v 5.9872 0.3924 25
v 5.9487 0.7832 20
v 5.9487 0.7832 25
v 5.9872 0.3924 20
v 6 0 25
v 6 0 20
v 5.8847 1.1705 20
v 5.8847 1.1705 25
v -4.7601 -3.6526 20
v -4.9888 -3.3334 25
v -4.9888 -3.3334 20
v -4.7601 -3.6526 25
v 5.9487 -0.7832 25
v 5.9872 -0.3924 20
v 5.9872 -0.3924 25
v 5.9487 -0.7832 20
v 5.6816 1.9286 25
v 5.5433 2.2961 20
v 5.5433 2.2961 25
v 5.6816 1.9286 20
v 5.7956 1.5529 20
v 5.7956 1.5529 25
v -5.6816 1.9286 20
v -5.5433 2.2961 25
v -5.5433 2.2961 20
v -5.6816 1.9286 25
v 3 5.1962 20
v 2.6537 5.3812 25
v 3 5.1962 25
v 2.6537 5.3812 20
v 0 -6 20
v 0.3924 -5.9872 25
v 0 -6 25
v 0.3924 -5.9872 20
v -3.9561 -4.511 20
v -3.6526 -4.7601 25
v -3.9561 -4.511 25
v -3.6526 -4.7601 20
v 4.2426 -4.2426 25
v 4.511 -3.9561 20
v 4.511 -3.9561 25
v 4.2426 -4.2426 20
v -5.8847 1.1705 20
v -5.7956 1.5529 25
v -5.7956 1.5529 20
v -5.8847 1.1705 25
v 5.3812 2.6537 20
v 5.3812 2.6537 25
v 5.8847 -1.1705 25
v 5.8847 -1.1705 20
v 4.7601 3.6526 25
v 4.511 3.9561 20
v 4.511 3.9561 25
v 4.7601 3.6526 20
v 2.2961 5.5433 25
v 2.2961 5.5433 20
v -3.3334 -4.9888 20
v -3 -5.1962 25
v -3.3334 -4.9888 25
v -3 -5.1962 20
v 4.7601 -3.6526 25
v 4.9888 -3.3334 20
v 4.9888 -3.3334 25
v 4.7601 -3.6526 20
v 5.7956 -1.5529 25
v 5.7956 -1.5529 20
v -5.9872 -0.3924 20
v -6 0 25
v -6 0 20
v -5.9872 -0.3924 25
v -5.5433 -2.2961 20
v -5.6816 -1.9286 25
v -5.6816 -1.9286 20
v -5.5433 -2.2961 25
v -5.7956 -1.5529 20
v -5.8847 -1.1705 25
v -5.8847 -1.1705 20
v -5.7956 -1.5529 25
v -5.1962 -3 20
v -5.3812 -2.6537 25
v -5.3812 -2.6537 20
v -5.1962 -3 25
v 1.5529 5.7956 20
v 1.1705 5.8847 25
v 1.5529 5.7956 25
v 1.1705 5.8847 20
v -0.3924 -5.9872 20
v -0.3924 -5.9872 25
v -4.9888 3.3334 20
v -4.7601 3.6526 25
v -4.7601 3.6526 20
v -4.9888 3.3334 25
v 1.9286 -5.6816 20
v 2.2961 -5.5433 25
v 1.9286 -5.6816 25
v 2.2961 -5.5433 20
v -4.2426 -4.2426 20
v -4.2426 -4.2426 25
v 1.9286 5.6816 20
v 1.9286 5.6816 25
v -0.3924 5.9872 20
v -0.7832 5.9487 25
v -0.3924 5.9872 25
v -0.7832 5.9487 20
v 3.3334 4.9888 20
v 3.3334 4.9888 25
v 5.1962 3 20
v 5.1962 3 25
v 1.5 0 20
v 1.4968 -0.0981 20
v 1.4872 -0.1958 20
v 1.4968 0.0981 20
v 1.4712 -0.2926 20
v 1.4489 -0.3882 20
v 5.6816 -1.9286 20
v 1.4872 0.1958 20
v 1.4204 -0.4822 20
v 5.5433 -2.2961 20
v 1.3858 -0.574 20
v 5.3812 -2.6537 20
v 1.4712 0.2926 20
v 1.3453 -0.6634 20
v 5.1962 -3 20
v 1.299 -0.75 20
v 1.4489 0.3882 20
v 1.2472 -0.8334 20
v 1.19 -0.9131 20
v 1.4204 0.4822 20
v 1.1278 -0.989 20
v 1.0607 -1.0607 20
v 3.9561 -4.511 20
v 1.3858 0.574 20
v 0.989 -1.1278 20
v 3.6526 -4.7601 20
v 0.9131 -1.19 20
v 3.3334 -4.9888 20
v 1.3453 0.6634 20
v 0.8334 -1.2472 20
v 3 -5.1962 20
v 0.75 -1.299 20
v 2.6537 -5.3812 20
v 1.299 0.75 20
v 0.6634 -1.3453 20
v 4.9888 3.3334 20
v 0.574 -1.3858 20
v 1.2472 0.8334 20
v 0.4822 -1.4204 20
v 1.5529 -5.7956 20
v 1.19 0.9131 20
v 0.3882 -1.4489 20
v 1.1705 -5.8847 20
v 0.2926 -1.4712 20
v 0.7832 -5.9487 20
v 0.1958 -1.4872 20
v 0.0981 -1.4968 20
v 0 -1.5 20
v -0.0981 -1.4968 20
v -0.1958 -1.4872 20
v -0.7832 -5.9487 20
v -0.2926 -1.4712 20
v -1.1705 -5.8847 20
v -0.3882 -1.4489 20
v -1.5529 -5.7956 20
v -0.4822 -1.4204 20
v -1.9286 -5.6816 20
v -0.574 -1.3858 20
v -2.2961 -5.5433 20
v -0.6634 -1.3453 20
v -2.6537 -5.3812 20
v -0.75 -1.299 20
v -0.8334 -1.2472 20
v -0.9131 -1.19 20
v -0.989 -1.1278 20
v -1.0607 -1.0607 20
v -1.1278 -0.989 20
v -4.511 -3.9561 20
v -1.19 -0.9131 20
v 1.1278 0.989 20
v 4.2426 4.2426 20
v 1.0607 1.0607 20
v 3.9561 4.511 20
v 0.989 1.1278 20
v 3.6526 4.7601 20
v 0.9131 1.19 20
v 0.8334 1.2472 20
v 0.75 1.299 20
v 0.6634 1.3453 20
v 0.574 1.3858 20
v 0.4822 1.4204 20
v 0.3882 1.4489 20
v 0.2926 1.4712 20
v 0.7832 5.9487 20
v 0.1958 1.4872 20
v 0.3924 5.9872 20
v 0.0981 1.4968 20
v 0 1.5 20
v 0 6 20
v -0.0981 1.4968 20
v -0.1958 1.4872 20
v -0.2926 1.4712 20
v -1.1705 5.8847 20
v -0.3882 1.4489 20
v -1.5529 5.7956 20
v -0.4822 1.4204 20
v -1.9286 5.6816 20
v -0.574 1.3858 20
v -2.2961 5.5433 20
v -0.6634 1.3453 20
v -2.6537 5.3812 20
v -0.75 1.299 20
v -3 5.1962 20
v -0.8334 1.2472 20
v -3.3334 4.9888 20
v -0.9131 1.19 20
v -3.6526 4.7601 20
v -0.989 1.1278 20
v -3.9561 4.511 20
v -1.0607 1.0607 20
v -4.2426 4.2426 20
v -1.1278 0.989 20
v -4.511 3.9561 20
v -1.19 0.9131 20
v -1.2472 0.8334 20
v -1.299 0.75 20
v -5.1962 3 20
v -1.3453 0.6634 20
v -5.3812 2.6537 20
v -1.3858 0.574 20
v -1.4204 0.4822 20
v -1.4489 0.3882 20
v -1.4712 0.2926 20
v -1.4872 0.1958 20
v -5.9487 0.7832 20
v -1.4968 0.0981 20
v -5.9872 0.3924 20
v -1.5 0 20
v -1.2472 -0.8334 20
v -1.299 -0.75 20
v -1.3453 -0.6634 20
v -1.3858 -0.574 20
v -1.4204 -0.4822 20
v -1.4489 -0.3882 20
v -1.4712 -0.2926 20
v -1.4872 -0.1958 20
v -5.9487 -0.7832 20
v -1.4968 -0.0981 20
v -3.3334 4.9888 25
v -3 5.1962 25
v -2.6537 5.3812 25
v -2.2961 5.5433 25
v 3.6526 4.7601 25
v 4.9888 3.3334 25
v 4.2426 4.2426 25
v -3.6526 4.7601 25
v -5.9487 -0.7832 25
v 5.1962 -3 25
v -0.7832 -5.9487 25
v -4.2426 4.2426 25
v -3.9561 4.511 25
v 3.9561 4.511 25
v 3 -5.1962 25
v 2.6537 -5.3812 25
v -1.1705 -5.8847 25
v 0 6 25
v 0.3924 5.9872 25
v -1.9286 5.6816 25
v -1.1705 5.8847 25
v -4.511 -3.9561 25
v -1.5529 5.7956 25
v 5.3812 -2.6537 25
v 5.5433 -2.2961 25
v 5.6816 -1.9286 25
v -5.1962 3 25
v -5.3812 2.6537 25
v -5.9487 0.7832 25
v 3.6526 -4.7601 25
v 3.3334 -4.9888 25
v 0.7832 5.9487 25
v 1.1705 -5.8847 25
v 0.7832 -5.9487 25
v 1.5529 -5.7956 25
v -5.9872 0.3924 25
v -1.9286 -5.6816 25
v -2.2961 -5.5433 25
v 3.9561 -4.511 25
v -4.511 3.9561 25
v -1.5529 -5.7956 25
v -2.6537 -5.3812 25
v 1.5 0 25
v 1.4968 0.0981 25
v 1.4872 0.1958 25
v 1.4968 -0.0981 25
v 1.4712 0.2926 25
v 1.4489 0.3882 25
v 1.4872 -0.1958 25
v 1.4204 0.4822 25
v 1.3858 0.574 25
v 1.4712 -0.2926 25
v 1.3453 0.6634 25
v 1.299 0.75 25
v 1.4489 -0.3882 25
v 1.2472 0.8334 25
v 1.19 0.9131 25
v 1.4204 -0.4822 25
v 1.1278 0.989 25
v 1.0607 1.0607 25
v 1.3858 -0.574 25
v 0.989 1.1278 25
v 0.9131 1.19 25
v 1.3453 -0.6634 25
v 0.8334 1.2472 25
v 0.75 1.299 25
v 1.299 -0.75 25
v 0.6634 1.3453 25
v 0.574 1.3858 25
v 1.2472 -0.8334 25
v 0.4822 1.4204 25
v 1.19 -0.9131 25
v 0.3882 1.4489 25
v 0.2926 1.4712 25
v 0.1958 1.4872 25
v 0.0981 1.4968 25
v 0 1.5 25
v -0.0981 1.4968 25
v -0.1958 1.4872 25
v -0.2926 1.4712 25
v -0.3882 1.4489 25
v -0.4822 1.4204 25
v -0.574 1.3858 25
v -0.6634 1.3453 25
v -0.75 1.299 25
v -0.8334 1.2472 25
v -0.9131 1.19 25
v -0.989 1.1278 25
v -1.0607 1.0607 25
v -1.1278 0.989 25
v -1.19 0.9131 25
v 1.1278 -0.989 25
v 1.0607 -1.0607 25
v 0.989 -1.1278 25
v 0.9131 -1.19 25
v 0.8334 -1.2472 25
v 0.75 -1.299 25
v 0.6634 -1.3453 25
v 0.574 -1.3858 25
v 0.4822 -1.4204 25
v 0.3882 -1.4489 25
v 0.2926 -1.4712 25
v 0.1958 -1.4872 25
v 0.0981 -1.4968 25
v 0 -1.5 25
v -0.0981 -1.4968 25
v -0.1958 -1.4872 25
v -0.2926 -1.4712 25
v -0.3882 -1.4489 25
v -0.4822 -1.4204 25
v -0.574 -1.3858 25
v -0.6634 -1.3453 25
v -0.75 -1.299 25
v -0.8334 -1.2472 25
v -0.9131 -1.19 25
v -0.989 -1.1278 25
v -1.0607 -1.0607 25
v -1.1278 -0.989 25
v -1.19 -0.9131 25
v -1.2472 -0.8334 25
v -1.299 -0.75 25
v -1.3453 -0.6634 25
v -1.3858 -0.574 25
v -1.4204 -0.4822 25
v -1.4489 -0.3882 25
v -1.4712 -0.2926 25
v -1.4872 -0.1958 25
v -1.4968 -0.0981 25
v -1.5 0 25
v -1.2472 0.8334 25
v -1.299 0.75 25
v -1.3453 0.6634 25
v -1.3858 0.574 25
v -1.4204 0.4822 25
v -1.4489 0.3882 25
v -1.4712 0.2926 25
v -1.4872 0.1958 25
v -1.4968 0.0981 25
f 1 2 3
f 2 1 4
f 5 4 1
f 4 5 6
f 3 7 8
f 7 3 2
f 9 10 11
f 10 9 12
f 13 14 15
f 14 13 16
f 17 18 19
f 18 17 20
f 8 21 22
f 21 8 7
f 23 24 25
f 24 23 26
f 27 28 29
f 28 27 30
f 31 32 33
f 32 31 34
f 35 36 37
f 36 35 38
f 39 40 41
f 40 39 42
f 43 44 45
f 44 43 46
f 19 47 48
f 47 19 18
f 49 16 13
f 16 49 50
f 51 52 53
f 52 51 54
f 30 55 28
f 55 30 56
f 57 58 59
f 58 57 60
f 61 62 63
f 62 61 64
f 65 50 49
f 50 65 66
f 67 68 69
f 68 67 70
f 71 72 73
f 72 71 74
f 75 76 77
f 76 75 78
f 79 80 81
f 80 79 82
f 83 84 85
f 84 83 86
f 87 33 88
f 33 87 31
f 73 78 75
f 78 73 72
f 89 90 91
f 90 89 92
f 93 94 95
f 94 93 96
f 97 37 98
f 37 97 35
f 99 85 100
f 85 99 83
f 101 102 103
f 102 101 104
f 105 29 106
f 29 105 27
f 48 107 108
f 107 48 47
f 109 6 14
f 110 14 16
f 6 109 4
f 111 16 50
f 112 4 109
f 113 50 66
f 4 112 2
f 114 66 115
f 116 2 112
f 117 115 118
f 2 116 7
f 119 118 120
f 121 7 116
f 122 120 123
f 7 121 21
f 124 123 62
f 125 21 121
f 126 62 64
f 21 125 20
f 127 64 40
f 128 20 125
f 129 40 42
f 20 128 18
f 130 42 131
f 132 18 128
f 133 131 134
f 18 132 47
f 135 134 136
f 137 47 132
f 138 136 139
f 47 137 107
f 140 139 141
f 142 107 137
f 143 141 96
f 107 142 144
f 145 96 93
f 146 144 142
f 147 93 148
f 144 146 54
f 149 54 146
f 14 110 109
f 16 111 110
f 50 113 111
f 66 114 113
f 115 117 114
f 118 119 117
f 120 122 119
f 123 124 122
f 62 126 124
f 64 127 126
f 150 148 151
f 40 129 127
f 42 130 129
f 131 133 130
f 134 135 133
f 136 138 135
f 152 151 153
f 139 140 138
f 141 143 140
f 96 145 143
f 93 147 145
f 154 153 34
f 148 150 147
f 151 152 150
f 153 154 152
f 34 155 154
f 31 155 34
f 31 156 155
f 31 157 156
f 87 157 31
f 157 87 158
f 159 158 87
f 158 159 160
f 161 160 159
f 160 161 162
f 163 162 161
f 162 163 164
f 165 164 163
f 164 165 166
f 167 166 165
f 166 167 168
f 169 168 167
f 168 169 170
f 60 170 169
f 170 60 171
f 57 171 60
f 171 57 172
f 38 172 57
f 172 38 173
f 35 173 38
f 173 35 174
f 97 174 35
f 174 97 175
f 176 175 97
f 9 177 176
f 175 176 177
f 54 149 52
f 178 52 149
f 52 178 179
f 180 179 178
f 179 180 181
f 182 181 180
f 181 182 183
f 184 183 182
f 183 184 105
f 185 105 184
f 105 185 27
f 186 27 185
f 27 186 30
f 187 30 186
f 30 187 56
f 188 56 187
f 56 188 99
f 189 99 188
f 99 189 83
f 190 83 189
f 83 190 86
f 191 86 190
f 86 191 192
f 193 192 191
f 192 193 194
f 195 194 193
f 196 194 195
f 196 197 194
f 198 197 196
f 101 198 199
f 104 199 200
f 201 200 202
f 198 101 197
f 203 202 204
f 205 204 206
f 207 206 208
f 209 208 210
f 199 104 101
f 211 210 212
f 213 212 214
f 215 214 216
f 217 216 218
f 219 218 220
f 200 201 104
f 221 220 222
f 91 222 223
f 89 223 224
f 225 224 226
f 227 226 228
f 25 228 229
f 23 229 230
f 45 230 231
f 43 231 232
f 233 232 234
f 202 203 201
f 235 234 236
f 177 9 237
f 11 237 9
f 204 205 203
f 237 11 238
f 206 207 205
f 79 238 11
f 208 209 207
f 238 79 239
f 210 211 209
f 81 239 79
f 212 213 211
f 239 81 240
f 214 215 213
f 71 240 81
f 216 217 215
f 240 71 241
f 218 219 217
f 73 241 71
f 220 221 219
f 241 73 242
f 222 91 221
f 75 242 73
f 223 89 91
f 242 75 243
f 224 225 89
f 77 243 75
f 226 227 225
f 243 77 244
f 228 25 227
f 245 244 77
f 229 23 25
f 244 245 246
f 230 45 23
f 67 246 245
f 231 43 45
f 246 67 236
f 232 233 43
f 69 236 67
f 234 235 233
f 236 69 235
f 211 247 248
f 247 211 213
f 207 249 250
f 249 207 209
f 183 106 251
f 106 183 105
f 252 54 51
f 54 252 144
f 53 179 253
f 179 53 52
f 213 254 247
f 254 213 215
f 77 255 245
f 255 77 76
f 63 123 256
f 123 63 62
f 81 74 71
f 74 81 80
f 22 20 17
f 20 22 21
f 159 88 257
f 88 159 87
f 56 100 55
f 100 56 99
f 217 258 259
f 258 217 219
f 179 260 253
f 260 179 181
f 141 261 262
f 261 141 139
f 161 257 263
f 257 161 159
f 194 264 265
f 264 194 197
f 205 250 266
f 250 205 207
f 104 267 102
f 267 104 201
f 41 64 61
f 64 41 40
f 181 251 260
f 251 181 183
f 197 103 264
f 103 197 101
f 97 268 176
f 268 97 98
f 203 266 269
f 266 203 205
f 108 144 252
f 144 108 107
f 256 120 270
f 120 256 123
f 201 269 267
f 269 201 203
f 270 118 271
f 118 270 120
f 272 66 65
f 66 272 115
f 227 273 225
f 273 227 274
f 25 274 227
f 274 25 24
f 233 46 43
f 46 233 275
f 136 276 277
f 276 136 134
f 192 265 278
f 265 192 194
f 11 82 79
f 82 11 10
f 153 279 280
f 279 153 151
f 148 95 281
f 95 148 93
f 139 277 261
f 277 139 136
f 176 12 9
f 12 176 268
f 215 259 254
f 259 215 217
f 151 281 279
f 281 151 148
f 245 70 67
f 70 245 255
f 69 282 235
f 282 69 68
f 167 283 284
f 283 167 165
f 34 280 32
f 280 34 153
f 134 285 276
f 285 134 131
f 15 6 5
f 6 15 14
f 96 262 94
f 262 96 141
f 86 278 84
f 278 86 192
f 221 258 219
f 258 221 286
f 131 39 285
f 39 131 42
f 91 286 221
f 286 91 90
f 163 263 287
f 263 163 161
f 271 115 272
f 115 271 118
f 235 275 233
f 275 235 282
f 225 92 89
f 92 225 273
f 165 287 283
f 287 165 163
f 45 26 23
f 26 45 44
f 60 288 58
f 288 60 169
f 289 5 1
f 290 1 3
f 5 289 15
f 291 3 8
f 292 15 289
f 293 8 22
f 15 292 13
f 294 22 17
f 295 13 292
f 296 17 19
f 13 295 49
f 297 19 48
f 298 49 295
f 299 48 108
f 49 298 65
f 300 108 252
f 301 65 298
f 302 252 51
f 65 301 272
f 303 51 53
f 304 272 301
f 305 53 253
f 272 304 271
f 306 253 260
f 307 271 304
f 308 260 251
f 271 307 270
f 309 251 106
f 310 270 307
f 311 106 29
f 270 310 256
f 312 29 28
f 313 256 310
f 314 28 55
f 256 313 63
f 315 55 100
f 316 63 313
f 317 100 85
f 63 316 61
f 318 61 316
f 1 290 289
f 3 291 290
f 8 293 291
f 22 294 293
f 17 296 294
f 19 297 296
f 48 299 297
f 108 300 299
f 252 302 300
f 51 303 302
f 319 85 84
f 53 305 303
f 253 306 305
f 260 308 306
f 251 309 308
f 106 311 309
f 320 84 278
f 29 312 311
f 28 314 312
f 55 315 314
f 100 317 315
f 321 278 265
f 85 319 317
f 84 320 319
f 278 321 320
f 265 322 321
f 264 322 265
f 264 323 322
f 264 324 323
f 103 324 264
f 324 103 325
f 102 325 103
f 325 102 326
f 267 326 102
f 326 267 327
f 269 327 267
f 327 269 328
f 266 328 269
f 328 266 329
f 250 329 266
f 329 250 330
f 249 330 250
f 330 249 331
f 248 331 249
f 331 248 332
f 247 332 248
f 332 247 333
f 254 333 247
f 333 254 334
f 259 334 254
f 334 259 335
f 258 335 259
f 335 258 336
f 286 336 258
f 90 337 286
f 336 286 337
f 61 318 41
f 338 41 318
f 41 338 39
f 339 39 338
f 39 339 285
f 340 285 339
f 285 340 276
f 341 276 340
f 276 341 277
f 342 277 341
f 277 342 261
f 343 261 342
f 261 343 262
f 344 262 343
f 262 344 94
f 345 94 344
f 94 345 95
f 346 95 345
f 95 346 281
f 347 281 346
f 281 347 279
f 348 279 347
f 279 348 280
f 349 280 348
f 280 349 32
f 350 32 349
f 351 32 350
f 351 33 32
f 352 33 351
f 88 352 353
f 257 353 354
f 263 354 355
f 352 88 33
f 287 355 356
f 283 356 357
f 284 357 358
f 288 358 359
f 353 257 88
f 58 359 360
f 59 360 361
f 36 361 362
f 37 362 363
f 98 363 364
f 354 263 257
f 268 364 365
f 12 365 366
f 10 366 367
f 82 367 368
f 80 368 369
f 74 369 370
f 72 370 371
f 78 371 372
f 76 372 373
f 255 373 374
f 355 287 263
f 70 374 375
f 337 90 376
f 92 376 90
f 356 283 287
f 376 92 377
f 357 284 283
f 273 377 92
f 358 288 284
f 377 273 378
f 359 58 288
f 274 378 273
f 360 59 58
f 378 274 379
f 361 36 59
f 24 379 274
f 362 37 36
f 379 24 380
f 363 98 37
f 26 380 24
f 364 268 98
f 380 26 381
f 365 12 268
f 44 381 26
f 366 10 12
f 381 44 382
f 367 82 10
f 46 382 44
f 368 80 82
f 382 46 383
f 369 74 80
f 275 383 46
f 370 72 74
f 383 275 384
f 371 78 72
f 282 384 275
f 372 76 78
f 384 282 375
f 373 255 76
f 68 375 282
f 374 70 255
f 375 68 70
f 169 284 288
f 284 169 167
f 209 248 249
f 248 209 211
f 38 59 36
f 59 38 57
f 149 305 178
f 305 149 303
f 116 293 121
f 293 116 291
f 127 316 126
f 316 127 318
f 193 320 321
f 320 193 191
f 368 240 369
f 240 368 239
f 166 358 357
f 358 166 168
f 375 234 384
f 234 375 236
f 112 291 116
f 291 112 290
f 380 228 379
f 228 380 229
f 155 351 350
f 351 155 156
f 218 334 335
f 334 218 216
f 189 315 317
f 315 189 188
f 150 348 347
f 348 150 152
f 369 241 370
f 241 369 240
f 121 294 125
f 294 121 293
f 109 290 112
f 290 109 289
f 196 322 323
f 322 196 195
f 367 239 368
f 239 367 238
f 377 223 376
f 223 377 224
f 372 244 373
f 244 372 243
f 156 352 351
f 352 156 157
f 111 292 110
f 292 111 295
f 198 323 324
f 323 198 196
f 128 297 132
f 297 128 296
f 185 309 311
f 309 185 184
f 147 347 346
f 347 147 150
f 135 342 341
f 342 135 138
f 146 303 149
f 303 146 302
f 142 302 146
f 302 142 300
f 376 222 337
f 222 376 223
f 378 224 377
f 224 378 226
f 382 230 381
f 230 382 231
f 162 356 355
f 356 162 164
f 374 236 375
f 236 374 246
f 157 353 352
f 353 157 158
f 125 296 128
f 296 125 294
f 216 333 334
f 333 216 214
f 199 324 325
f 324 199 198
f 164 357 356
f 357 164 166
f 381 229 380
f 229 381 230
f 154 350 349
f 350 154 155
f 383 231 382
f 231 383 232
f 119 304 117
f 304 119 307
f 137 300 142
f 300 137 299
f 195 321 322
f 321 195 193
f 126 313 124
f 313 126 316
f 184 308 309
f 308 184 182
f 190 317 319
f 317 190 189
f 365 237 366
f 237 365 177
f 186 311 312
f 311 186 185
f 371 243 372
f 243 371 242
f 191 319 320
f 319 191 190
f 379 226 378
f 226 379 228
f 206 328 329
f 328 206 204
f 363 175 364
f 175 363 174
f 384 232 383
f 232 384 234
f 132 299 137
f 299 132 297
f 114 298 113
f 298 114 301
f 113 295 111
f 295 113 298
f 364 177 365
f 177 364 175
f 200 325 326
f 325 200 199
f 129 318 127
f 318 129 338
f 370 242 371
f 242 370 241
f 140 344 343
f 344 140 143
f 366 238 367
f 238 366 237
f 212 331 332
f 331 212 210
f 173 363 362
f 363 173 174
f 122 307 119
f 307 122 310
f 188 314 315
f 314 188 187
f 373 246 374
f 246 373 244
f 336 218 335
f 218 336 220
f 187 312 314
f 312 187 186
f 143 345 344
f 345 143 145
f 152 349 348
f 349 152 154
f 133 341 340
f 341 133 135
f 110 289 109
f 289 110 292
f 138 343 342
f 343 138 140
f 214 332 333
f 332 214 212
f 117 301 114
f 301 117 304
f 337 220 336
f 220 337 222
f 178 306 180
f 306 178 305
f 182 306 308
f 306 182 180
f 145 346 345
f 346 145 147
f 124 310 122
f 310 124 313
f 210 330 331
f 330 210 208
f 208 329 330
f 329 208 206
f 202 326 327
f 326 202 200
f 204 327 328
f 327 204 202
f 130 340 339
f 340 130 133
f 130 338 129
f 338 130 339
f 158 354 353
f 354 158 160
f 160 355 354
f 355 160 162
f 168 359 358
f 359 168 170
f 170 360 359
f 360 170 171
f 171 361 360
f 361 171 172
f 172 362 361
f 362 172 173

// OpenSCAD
// Hose-barb reducer: 8 mm ID tubing to 5 mm ID tubing
// Print orientation: standing upright along Z, centred on origin in X/Y

$fn = 96;

// ---- Dimensions (mm) ----
eps      = 0.5;     // cutter overshoot past faces
barb8_h  = 10;      // height of each 8 mm tubing barb
barb8_d0 = 7.5;     // outer diameter of 8 mm barb at bottom
barb8_d1 = 9.5;     // outer diameter of 8 mm barb at top
barb5_h  = 8;       // height of each 5 mm tubing barb
barb5_d0 = 6.5;     // outer diameter of 5 mm barb at bottom
barb5_d1 = 5.0;     // outer diameter of 5 mm barb at top
collar_d = 12;      // diameter of cylindrical collar
length   = 41;      // overall length (z = 0 to z = 41)
bore     = 3;       // central through-bore diameter

// ---- Derived ----
barb8_r0 = barb8_d0 / 2;
barb8_r1 = barb8_d1 / 2;
barb5_r0 = barb5_d0 / 2;
barb5_r1 = barb5_d1 / 2;

// ---- Model ----
difference() {
    union() {
        // 8 mm tubing barbs: z = 0 to 20
        for (z = [0, barb8_h])
            translate([0, 0, z * barb8_h / 2])
                linear_extrude(height = bore + 2 * eps)
                    polygon([
                        [0, 0],
                        [(z * (barb8_r1 - barb8_r0)) / barb8_h,
                         (z * (barb8_r1 - barb8_r0)) / barb8_h],
                        [-(z * (barb8_r1 - barb8_r0)) / barb8_h,
                         -(z * (barb8_r1 - barb8_r0)) / barb8_h]
                    ]);

        // Cylindrical collar: z = 20 to 25
        translate([0, 0, 20])
            cylinder(d = collar_d, h = 5);

        // 5 mm tubing barbs: z = 25 to 41
        for (z = [0, barb5_h])
            translate([0, 0, 25 + z * barb5_h / 2])
                linear_extrude(height = bore + 2 * eps)
                    polygon([
                        [0, 0],
                        [(z * (barb5_r0 - barb5_r1)) / barb5_h,
                         (z * (barb5_r0 - barb5_r1)) / barb5_h],
                        [-(z * (barb5_r0 - barb5_r1)) / barb5_h,
                         -(z * (barb5_r0 - barb5_r1)) / barb5_h]
                    ]);
    }

    // Central through-bore, extends past both end faces
    translate([0, 0, -eps])
        cylinder(d = bore, h = length + 2 * eps);
}
